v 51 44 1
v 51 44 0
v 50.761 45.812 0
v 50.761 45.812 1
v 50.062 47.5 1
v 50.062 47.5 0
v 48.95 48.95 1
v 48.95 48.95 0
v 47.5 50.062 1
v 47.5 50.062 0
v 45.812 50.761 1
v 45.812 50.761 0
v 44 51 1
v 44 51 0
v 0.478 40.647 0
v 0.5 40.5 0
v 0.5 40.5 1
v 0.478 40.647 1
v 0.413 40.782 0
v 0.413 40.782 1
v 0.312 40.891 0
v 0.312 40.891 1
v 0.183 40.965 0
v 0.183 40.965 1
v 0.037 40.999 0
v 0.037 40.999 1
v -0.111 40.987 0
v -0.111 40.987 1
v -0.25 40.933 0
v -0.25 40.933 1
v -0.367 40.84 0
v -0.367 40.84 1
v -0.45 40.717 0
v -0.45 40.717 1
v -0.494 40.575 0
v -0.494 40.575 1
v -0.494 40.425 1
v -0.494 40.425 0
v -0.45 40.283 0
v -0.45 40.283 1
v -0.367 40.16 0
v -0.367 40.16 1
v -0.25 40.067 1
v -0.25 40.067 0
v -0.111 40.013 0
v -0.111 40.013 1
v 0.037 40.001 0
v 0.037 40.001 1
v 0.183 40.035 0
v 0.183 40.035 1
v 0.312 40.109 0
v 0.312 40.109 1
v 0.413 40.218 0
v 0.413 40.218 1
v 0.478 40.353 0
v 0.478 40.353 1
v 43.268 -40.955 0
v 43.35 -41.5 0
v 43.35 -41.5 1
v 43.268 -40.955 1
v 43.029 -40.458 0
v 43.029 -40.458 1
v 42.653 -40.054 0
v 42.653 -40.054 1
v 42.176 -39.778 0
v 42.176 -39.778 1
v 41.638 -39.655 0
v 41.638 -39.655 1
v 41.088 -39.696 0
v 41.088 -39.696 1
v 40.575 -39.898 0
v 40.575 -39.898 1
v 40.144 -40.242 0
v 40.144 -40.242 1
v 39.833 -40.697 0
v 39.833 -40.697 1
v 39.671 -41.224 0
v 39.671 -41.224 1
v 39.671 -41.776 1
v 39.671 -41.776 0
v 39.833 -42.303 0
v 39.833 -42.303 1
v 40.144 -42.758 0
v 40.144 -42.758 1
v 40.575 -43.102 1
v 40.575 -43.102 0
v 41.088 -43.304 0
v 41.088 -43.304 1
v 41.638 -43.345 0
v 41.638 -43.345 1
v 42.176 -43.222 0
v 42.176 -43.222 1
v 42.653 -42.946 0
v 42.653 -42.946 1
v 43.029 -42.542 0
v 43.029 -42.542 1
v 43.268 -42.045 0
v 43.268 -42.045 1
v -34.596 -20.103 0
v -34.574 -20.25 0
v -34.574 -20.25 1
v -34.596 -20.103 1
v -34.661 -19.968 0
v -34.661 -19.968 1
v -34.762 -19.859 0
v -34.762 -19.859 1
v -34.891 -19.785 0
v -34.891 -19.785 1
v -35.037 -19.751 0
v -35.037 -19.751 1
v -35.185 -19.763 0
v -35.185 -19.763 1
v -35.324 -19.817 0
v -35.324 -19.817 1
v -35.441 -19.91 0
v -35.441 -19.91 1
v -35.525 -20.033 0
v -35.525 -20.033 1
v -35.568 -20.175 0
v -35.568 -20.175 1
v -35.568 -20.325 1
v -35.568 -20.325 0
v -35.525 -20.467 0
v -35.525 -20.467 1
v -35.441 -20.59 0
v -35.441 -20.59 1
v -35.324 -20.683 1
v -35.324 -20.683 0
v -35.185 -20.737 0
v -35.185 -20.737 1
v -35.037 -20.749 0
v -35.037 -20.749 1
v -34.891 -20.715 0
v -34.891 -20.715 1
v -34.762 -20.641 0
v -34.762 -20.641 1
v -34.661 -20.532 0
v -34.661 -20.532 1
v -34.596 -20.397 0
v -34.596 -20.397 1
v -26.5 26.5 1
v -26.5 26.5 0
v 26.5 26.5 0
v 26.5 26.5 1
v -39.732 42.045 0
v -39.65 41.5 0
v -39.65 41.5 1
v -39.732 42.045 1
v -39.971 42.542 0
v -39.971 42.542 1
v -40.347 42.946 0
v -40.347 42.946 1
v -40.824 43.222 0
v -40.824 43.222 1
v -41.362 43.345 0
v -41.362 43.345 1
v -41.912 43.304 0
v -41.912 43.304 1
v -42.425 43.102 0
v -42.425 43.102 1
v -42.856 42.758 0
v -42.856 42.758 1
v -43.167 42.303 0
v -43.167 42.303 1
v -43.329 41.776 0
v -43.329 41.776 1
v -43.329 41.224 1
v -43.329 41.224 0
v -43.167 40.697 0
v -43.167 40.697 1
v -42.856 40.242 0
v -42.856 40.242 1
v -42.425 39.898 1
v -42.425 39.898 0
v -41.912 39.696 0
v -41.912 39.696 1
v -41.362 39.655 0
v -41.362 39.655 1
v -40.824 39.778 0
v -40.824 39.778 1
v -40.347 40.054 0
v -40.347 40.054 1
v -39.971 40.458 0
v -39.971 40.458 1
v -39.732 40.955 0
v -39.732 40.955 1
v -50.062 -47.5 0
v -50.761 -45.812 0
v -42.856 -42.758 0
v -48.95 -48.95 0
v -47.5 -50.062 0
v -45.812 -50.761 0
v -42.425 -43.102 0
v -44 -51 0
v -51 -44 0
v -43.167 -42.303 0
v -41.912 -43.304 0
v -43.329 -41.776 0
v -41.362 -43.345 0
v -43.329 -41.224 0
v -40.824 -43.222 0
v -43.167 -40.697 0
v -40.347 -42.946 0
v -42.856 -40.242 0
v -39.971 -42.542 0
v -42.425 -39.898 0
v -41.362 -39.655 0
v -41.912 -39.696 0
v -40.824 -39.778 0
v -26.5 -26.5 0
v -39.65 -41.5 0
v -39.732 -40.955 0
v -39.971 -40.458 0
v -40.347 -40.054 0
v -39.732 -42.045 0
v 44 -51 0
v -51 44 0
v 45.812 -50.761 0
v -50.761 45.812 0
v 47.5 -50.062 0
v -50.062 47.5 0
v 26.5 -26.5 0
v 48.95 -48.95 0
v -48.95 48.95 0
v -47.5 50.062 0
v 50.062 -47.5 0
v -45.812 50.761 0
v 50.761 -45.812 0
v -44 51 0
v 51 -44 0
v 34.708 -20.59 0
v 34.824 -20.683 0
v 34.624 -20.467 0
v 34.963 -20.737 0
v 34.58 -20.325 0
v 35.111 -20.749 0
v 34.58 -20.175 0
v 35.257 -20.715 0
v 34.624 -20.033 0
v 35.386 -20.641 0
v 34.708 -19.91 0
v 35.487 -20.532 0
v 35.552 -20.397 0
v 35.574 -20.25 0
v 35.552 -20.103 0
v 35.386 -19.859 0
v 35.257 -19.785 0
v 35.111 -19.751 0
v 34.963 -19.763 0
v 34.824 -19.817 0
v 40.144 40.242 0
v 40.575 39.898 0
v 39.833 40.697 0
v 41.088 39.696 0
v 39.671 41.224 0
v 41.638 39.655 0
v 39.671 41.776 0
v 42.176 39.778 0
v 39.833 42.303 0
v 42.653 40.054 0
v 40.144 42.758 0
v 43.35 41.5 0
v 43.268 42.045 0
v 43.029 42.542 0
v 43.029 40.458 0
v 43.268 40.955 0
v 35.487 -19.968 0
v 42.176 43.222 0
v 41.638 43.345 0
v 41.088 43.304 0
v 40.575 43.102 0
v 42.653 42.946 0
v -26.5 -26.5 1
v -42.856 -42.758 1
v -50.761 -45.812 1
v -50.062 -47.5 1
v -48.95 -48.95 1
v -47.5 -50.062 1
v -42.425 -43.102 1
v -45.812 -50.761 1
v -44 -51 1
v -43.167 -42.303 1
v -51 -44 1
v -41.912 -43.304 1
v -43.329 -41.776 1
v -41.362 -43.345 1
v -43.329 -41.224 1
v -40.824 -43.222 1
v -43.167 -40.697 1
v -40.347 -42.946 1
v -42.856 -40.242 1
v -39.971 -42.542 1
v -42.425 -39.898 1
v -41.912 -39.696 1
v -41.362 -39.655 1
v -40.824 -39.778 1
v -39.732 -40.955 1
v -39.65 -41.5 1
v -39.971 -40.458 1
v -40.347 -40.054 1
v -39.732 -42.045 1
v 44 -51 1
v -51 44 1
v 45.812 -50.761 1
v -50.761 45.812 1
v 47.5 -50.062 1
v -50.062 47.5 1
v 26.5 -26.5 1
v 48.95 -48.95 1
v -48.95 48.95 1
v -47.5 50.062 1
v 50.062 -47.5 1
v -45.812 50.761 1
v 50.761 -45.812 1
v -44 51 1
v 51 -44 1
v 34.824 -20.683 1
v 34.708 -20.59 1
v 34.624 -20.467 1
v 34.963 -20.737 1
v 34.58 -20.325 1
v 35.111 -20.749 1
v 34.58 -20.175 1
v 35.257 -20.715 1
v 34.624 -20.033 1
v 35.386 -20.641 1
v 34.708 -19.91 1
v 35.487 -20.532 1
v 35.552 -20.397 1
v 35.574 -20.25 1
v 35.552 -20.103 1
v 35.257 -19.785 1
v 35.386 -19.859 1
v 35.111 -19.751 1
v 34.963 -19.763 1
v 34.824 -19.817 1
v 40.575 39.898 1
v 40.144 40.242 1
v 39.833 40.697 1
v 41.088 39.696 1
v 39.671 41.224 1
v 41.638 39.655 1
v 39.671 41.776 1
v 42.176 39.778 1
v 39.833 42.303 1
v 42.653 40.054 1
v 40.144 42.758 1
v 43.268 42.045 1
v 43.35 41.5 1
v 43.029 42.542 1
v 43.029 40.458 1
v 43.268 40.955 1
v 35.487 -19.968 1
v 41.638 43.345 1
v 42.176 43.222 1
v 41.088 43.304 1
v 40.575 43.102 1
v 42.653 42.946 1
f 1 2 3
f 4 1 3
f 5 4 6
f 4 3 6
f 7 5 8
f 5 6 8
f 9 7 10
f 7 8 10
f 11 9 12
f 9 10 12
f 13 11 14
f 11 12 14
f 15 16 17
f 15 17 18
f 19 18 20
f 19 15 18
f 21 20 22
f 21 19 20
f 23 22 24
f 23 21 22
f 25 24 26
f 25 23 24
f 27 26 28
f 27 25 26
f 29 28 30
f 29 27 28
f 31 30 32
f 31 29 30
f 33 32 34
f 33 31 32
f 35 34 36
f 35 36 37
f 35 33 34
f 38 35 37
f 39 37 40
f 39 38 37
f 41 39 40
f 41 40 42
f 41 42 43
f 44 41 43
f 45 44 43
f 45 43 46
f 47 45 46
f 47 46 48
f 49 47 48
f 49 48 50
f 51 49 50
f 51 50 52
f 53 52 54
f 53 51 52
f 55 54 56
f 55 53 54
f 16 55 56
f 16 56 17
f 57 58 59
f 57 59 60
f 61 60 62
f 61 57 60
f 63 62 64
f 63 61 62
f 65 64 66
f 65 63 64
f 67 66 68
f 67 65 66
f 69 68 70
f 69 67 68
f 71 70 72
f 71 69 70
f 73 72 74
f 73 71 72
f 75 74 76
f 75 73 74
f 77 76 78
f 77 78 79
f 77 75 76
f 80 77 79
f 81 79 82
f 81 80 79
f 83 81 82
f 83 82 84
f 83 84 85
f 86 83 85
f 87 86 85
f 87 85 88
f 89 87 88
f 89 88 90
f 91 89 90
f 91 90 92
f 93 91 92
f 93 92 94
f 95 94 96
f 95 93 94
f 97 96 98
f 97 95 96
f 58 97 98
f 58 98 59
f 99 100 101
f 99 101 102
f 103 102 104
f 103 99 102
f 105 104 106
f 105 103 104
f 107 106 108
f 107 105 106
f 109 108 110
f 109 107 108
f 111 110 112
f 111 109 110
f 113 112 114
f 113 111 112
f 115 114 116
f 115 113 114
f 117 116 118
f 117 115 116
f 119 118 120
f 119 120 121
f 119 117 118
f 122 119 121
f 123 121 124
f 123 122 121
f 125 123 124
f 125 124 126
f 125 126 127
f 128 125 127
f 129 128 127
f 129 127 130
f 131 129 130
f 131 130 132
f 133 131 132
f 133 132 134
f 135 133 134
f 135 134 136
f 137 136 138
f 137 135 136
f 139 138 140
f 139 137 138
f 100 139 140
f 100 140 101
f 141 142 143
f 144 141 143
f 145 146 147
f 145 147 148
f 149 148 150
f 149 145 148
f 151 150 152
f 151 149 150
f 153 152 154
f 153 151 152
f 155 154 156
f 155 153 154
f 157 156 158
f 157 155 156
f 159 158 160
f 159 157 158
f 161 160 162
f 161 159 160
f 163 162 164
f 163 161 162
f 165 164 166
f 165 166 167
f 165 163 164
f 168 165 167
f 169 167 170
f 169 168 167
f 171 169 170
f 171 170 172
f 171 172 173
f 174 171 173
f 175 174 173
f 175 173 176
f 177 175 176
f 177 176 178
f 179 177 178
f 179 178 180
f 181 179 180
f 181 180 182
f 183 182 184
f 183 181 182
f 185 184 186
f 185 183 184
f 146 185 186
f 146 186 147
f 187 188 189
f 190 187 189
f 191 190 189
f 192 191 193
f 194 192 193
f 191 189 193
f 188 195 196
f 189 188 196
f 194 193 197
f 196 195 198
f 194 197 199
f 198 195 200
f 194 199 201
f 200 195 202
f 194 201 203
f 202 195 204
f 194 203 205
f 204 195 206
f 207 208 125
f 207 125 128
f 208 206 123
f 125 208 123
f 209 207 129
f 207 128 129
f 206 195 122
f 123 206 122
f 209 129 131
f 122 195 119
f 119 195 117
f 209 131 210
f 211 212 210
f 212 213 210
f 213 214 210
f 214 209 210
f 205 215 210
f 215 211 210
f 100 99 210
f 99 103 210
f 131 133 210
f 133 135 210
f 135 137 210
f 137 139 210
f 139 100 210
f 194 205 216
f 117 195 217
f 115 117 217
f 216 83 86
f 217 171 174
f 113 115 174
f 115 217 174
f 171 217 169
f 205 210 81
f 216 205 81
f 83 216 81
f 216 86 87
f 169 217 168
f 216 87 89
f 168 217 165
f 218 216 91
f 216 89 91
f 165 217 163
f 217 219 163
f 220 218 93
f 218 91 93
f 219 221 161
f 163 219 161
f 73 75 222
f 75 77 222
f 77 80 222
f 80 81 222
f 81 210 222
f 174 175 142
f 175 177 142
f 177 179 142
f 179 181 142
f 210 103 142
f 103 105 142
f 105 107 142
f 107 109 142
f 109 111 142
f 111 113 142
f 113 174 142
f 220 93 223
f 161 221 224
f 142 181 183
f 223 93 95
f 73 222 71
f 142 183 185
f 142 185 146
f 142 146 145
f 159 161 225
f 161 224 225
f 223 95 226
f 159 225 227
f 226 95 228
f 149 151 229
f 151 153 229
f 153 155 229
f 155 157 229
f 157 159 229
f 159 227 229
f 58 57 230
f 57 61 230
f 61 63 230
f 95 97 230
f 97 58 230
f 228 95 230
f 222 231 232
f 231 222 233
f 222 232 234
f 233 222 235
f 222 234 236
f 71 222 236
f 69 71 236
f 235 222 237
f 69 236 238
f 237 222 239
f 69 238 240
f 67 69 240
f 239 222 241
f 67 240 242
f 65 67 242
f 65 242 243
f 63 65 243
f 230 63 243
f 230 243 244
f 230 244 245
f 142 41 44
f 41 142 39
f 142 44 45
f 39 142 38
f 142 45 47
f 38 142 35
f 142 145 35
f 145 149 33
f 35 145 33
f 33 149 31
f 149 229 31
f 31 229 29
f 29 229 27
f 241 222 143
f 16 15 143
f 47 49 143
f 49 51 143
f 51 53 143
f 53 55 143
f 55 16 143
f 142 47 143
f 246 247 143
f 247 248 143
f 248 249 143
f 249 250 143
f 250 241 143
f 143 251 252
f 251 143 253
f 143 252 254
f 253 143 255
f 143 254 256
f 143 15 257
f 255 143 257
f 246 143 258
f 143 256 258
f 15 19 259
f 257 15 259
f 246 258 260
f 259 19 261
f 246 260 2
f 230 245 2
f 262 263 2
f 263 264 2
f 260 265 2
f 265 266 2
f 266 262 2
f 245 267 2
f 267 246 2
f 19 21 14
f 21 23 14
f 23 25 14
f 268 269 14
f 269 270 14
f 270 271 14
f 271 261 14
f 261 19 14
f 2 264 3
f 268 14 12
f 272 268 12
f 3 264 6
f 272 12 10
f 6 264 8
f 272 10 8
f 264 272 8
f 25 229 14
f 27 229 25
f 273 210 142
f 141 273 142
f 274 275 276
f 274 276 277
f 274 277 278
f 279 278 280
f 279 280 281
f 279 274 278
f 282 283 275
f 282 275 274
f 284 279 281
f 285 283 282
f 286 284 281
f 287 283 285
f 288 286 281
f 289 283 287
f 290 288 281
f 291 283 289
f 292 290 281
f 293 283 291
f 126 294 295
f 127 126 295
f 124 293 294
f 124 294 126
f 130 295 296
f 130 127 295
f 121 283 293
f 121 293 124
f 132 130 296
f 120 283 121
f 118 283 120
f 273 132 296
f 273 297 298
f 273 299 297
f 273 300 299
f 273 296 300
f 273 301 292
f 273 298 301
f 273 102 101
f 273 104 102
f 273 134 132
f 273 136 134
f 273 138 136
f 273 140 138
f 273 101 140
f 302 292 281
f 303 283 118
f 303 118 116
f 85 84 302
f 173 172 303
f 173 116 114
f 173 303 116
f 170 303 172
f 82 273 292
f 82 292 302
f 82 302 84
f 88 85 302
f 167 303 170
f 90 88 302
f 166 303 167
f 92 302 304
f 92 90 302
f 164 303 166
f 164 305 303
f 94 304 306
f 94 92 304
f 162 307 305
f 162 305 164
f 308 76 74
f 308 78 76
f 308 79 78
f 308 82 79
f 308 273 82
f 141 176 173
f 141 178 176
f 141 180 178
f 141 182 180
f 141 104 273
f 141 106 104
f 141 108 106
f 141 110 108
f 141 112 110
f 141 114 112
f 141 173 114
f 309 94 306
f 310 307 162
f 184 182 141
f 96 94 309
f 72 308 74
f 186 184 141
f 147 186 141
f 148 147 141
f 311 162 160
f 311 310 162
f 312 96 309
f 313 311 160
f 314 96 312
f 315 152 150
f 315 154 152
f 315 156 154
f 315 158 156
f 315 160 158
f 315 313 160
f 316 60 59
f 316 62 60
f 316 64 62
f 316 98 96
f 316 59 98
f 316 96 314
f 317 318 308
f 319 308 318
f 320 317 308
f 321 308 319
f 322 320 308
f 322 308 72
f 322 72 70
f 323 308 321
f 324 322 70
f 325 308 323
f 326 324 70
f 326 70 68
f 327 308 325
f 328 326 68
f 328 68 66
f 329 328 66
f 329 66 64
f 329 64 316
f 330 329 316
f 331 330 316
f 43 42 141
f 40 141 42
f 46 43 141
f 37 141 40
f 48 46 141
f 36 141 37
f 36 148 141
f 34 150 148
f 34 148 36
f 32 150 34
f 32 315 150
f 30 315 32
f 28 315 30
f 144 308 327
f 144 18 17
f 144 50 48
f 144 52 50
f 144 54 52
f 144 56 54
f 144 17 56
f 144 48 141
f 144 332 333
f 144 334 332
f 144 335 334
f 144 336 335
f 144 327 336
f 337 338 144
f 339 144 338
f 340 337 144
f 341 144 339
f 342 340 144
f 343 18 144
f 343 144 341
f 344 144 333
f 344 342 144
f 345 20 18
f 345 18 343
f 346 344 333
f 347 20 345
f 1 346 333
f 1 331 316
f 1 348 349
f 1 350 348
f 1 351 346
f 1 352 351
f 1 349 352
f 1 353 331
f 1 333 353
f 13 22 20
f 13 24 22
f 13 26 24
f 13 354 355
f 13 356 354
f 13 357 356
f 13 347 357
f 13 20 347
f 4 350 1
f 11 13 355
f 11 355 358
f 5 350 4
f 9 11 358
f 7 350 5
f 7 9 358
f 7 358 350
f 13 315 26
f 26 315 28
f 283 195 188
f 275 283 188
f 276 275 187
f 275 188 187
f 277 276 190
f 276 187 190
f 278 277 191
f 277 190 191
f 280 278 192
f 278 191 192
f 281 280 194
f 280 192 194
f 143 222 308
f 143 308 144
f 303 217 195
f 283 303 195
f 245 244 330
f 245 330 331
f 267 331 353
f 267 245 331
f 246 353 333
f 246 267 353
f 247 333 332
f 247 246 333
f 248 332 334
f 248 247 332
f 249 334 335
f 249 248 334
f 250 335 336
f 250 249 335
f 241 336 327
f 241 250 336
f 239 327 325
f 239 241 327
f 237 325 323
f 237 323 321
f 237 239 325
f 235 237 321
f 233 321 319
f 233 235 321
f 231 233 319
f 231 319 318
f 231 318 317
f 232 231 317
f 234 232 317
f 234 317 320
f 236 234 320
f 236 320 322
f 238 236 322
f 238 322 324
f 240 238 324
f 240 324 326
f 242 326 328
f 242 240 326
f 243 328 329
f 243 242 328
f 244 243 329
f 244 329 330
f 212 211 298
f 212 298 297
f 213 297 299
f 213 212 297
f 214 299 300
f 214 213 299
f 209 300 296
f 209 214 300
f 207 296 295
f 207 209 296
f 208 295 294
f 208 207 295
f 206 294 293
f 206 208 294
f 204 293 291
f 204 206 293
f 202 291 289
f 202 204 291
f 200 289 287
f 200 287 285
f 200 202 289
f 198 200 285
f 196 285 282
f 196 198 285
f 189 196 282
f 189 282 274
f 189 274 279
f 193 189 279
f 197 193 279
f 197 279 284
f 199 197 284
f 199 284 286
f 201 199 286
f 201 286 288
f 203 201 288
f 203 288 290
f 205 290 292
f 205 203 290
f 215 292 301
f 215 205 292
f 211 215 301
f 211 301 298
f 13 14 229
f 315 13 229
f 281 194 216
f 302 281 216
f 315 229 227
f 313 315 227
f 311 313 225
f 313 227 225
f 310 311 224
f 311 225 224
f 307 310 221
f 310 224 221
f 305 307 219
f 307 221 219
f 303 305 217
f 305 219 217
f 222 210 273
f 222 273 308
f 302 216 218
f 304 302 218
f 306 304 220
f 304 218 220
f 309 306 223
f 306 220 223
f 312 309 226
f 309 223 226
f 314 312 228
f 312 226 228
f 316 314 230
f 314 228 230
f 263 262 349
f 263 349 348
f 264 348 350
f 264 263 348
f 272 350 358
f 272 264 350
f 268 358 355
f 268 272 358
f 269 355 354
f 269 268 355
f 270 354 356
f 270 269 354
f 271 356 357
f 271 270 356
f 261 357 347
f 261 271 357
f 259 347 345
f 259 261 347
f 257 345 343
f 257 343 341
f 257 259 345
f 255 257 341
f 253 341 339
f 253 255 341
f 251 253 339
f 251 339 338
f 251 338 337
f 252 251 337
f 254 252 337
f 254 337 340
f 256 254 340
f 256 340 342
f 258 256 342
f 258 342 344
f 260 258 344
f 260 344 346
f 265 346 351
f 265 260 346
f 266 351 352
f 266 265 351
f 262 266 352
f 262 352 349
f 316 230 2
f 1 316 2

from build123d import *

# Parameters (mm, degrees)
F0_R     = 1.85
F0_R_2   = 0.5
F0_W     = 53
F0_H     = 53
F1_DEPTH = 1


with BuildPart() as f1:
    # F0 (on Top) → F1 (new body)
    with BuildSketch(Plane.XY):
        with BuildLine():
            Line((-44, -51), (44, -51))
            ThreePointArc((44, -51), (48.949747, -48.949747), (51, -44))
            Line((51, -44), (51, 44))
            ThreePointArc((51, 44), (48.949747, 48.949747), (44, 51))
            Line((44, 51), (-44, 51))
            ThreePointArc((-44, 51), (-48.949747, 48.949747), (-51, 44))
            Line((-51, 44), (-51, -44))
            ThreePointArc((-51, -44), (-48.949747, -48.949747), (-44, -51))
        make_face()
        with Locations((-41.5, -41.5)):
            Circle(F0_R, mode=Mode.SUBTRACT)
        with Locations((-35.074029, -20.25)):
            Circle(F0_R_2, mode=Mode.SUBTRACT)
        with Locations((41.5, -41.5)):
            Circle(F0_R, mode=Mode.SUBTRACT)
        with Locations((35.074029, -20.25)):
            Circle(F0_R_2, mode=Mode.SUBTRACT)
        with Locations((-41.5, 41.5)):
            Circle(F0_R, mode=Mode.SUBTRACT)
        Rectangle(F0_W, F0_H, mode=Mode.SUBTRACT)
        with Locations((0, 40.5)):
            Circle(F0_R_2, mode=Mode.SUBTRACT)
        with Locations((41.5, 41.5)):
            Circle(F0_R, mode=Mode.SUBTRACT)
    extrude(amount=F1_DEPTH)


solid = f1.part
